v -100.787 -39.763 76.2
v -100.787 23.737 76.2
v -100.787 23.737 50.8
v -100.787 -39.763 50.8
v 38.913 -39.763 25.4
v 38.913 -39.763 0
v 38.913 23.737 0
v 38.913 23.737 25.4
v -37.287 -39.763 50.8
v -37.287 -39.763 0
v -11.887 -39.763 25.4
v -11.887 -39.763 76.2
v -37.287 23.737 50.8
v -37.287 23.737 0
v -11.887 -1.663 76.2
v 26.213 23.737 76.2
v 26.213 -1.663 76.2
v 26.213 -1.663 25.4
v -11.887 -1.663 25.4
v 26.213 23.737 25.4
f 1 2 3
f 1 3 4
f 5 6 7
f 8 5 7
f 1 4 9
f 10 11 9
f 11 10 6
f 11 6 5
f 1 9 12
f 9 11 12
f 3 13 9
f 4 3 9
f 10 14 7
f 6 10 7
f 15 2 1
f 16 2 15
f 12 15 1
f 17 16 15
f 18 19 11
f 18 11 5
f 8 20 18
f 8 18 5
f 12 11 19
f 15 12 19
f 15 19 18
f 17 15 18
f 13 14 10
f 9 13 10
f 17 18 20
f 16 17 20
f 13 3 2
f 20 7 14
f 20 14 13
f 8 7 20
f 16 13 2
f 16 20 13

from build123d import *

# Parameters (mm, degrees)
F0_W     = 76.2
F0_H     = 63.5
F1_DEPTH = 25.4
F3_DEPTH = 50.8
F4_W     = 63.5
F4_H     = 25.4
F5_DEPTH = 63.5


with BuildPart() as f1:
    # F0 (on Top) → F1 (new body)
    with BuildSketch(Plane.XY):
        with Locations((0.813381, -8.013141)):
            Rectangle(F0_W, F0_H)
    extrude(amount=F1_DEPTH)

    # F2 (on face) → F3 (join)
    with BuildSketch(Plane.XY.offset(25.4)):
        Polygon((-37.286619, 23.736859), (-37.286619, -39.763141), (-11.886619, -39.763141), (-11.886619, -1.663141), (26.213381, -1.663141), (26.213381, 23.736859), align=None)
    extrude(amount=F3_DEPTH)

    # F4 (on face) → F5 (join)
    with BuildSketch(Plane(origin=(-37.286619, 0, 0), x_dir=(0, -1, 0), z_dir=(-1, 0, 0))):
        with Locations((8.013141, 63.5)):
            Rectangle(F4_W, F4_H)
    extrude(amount=F5_DEPTH)


solid = f1.part
